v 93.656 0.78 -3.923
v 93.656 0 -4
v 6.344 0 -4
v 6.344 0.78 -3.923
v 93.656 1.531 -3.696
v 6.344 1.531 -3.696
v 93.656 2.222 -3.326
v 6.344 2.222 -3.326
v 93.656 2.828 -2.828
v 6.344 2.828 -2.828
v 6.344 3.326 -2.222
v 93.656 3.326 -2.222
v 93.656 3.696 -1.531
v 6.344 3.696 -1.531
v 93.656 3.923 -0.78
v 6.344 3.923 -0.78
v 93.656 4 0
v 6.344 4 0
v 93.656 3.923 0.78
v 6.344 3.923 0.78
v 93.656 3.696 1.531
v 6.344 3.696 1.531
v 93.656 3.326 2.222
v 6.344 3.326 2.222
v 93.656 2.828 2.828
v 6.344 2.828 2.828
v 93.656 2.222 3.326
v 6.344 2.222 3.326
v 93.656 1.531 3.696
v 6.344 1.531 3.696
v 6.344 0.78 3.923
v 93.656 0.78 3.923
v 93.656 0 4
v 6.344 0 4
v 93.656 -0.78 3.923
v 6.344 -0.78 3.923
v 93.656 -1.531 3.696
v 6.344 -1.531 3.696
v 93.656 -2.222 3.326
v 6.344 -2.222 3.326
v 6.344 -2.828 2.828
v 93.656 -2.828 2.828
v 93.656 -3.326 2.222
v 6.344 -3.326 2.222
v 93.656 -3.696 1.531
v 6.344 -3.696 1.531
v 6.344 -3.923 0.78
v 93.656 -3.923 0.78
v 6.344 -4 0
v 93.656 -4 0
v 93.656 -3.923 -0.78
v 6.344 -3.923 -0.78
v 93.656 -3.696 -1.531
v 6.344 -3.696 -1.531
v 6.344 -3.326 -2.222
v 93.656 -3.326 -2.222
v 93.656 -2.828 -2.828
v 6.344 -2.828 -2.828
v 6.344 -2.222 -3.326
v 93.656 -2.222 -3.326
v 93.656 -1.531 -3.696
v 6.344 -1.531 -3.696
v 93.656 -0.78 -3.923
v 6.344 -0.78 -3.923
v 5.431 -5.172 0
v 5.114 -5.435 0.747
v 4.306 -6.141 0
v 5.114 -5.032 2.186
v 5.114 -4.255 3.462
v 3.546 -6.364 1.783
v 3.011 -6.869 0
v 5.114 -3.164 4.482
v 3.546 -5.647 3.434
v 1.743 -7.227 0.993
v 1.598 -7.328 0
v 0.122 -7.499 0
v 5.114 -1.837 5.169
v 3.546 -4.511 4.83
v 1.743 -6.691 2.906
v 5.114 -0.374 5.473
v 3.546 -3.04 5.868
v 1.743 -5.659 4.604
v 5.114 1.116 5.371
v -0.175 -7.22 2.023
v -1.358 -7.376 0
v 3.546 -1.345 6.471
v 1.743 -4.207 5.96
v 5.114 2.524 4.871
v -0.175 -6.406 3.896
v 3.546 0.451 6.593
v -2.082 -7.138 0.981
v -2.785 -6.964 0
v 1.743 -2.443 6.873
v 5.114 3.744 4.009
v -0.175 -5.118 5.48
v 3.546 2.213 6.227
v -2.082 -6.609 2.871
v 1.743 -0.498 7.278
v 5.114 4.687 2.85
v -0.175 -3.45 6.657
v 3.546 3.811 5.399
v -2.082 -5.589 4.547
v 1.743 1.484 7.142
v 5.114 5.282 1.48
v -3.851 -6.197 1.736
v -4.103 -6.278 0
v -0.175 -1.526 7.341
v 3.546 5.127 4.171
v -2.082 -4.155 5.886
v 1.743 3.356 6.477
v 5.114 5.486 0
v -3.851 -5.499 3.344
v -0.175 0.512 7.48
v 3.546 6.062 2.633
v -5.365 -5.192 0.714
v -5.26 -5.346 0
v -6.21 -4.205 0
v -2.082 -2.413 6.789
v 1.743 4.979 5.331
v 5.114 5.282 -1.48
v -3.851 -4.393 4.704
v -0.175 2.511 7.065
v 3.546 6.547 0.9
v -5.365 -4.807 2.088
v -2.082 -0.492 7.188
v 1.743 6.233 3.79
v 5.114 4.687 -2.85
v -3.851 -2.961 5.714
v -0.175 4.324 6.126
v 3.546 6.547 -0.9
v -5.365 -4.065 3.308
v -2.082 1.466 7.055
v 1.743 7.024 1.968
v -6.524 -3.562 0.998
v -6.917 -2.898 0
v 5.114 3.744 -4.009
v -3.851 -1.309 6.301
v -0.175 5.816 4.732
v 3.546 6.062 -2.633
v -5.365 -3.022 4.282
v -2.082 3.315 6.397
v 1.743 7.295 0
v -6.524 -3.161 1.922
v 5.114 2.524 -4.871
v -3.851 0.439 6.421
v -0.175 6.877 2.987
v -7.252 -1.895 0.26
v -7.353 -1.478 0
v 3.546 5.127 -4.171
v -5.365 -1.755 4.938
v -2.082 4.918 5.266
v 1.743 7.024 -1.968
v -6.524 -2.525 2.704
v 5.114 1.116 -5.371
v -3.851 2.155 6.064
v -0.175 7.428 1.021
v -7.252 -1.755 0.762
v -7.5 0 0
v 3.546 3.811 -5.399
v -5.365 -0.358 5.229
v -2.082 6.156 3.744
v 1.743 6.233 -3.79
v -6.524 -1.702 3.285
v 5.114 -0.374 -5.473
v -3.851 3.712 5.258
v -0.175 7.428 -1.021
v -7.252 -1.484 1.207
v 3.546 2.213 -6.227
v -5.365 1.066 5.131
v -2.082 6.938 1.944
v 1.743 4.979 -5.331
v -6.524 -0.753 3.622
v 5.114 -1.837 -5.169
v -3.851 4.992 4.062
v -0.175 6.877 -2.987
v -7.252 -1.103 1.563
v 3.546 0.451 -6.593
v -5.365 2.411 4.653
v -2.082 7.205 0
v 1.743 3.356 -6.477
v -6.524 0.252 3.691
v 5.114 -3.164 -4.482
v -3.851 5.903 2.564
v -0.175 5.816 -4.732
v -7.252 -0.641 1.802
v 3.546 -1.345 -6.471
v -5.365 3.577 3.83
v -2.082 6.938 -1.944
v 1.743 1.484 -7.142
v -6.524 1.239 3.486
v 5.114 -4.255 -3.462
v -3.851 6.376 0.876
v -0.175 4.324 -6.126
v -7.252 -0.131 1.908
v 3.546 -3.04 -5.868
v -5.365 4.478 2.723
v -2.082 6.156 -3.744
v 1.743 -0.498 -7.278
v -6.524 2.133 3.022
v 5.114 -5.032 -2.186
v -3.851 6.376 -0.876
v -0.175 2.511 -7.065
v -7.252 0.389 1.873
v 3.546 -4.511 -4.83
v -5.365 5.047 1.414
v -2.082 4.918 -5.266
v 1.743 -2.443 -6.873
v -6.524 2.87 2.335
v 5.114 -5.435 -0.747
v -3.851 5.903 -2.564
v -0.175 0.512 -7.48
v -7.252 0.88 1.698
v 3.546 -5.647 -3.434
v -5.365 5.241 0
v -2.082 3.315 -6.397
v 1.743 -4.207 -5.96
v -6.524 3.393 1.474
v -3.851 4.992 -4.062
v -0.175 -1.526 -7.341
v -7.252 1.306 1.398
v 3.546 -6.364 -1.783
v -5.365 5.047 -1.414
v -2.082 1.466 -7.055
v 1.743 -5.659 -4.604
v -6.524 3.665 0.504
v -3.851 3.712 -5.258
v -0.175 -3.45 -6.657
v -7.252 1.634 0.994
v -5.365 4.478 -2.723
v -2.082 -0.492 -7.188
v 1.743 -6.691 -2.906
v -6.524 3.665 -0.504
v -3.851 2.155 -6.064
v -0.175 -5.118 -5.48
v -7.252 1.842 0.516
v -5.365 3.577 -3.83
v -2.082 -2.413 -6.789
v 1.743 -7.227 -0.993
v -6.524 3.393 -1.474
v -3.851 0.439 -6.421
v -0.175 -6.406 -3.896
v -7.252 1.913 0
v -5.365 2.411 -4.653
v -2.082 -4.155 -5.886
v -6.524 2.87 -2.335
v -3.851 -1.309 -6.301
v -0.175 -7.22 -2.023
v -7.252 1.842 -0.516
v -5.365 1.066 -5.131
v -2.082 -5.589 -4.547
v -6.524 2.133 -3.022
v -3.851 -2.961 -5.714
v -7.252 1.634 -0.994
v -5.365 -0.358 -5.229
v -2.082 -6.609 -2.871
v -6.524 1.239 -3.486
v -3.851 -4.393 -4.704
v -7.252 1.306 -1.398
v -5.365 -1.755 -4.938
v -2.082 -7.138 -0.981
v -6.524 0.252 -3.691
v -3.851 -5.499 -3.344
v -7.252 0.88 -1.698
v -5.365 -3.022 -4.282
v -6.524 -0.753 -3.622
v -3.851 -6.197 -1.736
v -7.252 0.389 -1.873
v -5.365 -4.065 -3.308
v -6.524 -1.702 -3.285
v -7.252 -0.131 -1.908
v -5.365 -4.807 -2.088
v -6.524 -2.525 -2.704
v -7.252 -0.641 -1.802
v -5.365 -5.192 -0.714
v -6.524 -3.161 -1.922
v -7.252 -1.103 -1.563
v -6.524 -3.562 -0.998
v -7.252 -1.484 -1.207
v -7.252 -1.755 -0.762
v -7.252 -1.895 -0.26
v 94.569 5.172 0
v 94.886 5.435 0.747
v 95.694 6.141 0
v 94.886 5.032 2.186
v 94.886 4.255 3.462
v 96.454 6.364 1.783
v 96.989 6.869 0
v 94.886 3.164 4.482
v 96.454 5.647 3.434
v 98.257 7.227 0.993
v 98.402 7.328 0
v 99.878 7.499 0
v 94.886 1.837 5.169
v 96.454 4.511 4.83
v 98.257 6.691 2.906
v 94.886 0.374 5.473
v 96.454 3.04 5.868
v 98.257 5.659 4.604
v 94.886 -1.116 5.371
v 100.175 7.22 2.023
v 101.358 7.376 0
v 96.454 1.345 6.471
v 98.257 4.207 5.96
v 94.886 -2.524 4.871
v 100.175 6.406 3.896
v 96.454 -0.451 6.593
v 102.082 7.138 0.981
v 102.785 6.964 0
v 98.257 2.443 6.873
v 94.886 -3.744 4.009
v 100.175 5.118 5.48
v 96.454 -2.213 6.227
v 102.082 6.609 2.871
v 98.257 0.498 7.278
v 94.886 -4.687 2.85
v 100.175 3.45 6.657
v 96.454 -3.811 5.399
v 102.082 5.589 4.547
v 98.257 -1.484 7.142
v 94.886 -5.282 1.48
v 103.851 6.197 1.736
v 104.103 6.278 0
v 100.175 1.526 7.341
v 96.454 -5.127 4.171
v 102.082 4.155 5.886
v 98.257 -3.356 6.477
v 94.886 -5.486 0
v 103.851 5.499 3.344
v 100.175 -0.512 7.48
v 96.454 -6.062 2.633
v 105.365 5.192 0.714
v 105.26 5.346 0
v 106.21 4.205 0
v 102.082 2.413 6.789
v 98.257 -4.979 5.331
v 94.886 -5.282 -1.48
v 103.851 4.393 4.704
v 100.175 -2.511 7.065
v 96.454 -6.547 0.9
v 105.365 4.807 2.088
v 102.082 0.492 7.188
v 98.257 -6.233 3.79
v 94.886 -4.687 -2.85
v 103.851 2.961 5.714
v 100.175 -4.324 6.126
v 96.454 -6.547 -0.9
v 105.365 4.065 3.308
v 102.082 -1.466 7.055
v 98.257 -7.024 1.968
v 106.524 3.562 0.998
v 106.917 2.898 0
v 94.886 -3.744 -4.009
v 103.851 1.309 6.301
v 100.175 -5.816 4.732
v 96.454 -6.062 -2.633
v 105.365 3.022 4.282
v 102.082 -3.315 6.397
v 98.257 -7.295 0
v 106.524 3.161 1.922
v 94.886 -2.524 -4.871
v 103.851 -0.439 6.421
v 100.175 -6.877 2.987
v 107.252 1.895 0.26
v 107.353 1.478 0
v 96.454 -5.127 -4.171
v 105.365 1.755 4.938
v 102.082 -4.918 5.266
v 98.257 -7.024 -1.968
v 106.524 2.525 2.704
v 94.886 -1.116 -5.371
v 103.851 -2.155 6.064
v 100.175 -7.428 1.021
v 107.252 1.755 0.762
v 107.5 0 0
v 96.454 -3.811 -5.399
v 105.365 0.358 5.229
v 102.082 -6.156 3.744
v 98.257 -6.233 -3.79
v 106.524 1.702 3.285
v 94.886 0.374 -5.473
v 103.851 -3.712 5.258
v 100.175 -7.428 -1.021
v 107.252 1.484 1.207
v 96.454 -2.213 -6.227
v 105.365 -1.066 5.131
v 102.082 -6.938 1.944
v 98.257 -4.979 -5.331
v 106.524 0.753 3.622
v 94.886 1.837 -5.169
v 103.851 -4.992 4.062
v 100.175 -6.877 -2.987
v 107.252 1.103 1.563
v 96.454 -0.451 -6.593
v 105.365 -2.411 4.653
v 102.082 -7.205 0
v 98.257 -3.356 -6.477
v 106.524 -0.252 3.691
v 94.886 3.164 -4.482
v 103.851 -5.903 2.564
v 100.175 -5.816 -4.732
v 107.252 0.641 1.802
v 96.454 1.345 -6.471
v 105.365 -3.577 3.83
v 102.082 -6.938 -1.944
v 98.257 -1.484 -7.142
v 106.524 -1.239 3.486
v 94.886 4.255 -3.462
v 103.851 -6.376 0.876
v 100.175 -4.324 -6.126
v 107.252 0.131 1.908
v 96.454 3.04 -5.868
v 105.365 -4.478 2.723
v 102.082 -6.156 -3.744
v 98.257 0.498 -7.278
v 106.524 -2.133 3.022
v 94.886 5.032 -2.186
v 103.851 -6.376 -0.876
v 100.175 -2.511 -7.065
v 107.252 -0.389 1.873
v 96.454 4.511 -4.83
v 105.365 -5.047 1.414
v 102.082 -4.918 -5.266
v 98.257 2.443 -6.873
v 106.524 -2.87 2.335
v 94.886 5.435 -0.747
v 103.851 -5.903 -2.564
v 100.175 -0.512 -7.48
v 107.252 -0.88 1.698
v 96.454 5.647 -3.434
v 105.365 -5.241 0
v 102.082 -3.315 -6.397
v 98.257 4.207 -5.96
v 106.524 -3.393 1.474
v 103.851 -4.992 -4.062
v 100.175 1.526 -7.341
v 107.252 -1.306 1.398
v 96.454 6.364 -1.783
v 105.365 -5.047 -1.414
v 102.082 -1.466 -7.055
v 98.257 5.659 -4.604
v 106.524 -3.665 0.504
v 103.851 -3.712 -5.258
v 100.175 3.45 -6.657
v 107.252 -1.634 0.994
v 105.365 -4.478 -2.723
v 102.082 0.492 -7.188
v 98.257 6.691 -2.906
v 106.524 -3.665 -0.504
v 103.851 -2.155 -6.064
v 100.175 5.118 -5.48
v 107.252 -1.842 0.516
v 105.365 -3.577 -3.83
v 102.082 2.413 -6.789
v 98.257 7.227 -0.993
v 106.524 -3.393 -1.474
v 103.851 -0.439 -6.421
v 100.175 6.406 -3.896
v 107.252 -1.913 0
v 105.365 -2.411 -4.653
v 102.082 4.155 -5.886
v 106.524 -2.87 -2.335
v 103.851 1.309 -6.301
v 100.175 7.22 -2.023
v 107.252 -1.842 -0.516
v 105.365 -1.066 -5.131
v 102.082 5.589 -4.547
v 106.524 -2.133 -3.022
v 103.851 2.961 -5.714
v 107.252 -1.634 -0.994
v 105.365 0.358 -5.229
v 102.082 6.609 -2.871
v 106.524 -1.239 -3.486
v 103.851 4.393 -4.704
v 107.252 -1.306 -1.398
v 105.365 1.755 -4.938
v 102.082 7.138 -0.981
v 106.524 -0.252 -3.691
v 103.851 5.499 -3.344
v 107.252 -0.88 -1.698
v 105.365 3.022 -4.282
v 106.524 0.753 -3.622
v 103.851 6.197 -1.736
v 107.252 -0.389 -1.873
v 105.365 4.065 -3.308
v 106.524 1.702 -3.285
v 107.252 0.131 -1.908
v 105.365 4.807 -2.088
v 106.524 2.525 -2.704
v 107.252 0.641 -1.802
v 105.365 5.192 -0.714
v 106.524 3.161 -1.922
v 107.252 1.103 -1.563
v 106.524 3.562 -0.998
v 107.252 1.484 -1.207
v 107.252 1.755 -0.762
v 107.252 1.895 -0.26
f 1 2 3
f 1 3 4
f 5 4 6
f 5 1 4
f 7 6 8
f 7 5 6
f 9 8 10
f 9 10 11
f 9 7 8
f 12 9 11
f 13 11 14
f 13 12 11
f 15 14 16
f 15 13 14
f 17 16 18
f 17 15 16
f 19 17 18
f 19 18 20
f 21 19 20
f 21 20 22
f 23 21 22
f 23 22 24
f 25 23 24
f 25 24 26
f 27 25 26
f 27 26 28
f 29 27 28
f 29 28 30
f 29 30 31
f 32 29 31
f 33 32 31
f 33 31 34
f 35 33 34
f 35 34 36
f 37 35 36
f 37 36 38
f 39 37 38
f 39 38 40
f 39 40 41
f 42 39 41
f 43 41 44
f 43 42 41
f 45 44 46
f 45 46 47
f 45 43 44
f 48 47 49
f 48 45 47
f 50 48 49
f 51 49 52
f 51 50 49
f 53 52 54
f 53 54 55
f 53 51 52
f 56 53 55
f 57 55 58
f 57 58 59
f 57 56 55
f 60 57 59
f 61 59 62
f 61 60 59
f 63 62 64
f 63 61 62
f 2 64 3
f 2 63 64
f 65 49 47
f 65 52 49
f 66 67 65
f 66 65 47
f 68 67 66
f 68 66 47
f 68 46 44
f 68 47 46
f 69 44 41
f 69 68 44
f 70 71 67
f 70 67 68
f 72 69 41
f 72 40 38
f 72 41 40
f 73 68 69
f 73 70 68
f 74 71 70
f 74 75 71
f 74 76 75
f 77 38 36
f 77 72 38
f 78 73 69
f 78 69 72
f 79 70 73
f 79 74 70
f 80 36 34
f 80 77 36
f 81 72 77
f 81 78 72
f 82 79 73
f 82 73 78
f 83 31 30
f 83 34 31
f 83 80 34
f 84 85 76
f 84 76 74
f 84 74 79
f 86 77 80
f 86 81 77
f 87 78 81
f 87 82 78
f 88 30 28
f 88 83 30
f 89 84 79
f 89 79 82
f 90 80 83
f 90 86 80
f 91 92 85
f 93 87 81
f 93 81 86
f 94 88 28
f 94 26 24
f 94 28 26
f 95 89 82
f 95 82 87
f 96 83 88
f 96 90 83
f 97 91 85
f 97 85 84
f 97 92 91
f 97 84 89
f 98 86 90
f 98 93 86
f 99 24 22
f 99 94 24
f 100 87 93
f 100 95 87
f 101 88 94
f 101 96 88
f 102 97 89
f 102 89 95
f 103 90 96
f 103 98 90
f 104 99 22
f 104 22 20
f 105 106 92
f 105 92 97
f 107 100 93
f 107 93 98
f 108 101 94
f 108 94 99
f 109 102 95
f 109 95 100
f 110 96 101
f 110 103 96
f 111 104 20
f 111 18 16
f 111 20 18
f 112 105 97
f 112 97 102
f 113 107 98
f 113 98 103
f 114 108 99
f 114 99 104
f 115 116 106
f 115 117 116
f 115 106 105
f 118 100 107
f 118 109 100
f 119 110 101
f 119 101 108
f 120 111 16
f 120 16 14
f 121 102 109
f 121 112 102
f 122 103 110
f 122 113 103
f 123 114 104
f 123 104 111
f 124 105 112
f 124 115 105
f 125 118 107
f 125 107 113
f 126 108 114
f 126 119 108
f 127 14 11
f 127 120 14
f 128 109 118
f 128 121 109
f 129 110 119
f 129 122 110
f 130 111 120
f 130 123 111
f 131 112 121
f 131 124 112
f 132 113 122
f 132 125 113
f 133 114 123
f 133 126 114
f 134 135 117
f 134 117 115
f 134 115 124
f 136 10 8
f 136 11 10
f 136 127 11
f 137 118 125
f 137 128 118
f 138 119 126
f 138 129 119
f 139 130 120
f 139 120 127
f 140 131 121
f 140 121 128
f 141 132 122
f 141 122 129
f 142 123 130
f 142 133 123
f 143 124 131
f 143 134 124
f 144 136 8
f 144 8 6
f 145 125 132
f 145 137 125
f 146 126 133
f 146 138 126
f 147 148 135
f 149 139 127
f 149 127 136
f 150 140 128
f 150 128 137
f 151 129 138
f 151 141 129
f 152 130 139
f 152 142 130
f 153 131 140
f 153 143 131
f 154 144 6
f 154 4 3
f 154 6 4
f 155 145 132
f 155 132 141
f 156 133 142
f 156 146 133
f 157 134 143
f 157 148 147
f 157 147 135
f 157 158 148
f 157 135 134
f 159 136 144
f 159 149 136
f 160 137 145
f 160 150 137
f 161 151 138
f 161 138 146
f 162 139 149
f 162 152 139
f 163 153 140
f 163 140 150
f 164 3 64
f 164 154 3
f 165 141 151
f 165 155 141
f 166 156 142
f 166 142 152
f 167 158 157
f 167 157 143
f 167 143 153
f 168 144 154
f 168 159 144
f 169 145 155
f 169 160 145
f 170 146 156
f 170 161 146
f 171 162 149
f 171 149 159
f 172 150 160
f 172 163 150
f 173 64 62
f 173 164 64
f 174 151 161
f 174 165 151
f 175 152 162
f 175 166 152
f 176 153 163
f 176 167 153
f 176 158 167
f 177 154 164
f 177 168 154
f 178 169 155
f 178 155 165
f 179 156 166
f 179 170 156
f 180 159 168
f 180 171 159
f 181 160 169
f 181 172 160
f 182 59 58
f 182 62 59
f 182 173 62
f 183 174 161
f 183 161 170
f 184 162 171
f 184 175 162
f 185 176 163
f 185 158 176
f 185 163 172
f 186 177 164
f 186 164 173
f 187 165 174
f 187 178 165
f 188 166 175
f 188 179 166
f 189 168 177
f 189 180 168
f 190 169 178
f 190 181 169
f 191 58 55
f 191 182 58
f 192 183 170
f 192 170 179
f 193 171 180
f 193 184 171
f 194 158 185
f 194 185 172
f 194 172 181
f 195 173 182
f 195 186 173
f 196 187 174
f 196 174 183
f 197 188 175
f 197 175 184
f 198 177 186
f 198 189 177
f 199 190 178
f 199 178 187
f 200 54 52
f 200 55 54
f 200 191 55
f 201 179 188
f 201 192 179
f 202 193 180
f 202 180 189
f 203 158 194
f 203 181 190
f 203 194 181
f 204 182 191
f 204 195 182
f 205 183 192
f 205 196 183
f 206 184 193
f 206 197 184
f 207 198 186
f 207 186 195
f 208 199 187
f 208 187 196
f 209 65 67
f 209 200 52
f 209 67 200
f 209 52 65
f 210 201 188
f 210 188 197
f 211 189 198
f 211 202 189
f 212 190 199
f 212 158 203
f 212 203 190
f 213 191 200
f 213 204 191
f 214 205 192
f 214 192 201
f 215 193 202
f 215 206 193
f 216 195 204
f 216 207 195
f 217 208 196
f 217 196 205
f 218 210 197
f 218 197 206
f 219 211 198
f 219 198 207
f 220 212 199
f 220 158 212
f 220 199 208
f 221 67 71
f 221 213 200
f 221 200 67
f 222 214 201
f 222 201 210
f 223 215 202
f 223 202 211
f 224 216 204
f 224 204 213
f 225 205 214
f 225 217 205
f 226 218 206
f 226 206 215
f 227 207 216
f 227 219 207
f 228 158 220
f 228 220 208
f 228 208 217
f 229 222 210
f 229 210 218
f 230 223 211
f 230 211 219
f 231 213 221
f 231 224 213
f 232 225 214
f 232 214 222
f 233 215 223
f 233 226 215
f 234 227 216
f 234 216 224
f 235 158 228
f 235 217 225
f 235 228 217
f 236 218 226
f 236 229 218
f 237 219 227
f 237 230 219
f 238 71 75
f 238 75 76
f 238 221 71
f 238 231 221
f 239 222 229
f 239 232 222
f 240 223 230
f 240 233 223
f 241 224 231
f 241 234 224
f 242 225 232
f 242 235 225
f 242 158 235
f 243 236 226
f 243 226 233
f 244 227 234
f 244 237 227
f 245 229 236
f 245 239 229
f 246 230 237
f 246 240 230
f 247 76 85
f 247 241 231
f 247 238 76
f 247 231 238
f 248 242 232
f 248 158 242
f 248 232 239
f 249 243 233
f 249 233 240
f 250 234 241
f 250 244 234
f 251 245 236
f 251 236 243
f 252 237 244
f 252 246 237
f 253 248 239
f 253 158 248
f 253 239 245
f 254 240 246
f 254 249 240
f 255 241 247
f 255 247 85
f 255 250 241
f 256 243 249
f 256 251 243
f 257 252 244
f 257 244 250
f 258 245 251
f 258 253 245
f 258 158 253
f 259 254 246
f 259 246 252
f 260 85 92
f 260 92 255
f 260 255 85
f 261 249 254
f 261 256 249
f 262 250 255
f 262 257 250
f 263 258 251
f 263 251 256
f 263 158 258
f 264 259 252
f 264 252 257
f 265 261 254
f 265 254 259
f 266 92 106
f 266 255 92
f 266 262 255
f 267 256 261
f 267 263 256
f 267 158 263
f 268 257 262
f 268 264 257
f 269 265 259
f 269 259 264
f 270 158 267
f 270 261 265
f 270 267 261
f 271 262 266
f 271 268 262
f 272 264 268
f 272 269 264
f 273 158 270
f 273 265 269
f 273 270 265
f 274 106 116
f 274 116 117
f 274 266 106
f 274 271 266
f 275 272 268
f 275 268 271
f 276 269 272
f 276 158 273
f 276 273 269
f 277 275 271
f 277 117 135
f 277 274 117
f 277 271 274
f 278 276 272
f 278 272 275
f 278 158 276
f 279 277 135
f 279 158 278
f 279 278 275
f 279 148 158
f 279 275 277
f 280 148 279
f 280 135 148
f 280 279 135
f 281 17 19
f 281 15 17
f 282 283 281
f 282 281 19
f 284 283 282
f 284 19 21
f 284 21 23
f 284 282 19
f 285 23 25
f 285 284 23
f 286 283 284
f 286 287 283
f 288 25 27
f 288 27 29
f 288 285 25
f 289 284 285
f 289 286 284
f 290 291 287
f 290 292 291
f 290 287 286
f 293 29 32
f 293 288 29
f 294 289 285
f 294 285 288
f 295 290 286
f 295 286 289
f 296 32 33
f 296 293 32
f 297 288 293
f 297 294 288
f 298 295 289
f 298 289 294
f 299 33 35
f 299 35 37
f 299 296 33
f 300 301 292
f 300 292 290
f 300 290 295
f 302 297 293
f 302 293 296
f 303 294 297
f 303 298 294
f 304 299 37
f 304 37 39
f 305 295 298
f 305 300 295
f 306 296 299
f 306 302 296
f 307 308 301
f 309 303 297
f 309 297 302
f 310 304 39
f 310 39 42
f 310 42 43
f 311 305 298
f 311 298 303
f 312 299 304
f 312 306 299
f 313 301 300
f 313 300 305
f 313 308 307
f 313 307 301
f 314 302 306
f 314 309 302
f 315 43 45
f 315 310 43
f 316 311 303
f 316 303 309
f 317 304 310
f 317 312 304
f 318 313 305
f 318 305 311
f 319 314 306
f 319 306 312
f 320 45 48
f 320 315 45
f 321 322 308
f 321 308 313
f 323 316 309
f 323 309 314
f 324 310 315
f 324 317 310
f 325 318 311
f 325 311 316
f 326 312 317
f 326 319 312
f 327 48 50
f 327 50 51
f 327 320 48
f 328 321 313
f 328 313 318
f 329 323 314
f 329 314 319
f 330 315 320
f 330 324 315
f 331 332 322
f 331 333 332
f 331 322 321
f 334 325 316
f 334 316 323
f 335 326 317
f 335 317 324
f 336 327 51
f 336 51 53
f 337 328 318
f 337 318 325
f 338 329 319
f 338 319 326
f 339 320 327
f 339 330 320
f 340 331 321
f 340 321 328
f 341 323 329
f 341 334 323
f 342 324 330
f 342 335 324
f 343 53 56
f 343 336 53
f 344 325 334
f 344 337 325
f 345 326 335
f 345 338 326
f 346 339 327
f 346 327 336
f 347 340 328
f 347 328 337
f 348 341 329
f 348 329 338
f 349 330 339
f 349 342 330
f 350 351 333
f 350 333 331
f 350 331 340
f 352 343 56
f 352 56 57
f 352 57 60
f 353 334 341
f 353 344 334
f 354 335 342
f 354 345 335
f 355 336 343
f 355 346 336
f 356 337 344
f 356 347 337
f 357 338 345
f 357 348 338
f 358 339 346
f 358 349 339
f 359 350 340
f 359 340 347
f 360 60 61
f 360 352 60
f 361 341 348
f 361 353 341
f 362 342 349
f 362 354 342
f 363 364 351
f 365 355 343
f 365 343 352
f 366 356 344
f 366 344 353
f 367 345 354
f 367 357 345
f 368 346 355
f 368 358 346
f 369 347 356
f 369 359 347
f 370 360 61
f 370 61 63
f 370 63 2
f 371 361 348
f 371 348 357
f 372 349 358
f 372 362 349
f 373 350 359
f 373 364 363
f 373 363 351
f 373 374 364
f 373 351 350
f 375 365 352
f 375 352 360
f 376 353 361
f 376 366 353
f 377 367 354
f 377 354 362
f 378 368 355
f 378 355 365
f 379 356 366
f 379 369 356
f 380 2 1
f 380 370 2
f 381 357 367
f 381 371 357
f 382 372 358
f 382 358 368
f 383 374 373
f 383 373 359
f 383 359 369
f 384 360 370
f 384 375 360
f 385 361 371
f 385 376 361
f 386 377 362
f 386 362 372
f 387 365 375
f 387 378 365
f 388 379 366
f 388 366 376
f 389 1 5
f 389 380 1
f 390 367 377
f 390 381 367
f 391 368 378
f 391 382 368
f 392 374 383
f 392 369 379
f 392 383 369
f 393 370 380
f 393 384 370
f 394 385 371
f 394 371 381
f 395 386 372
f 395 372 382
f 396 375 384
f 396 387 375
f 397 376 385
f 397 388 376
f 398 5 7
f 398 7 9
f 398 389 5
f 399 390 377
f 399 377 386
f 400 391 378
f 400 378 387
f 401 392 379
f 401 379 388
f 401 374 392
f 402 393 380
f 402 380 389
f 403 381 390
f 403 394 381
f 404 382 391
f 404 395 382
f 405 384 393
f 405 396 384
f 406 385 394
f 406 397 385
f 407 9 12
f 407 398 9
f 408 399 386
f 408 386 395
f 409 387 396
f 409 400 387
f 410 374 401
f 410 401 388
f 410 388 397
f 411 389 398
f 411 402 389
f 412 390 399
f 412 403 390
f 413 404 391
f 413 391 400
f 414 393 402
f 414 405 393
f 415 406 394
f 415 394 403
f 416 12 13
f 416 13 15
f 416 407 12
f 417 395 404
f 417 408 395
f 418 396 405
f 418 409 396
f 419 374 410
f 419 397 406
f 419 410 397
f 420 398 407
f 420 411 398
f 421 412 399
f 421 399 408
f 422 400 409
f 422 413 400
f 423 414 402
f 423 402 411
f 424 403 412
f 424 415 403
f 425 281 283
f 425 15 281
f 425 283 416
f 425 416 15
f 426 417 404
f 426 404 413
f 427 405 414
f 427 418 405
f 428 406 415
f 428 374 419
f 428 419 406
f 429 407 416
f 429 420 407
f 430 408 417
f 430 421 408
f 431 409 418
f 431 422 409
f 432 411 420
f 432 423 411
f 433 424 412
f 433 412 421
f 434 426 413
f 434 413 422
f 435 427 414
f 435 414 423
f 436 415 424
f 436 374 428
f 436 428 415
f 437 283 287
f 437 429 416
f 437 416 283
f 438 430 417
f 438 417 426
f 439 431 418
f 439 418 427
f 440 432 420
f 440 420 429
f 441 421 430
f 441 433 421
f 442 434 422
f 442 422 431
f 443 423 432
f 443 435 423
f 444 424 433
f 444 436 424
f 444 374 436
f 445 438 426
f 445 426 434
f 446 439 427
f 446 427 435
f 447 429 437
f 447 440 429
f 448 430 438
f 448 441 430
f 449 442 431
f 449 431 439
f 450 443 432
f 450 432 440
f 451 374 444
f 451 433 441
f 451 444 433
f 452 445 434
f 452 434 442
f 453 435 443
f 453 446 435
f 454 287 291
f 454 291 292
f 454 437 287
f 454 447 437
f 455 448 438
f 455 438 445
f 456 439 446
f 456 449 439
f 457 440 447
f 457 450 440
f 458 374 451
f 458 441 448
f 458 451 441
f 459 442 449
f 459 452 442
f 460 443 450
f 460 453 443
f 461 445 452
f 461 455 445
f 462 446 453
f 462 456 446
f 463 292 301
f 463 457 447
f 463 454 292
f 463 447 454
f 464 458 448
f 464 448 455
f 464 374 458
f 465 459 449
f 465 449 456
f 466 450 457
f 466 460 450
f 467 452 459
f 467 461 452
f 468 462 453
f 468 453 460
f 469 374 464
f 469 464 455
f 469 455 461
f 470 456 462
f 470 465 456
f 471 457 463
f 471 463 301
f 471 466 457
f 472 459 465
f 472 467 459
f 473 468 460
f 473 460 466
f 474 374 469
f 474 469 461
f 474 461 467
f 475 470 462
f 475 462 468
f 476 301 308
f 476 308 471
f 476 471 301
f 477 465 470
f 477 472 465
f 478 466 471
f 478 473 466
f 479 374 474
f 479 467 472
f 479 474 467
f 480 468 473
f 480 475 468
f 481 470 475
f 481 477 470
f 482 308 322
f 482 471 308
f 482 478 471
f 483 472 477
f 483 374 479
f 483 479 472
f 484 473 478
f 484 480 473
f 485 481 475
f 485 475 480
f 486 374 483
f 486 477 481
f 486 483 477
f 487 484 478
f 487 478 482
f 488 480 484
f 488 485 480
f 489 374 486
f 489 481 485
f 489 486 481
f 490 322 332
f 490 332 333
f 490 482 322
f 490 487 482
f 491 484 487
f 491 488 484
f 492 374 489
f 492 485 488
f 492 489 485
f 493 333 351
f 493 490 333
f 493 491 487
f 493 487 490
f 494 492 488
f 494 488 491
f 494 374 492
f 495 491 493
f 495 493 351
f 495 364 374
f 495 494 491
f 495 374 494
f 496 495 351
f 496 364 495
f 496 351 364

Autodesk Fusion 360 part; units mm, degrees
cylinder "CylinderPrimitive1" add diameter 8 height 100 placed x (0, 0, -1) y (0, 1, 0) z (1, 0, 0) at (0, 0, 0)
sphere "SpherePrimitive1" add diameter 15 placed x (0, -1, 0) y (0, 0, 1) z (-1, 0, 0) at (0, 0, 0)
sphere "SpherePrimitive2" add diameter 15 placed x (0, 1, 0) y (0, 0, 1) z (1, 0, 0) at (100, 0, 0)
